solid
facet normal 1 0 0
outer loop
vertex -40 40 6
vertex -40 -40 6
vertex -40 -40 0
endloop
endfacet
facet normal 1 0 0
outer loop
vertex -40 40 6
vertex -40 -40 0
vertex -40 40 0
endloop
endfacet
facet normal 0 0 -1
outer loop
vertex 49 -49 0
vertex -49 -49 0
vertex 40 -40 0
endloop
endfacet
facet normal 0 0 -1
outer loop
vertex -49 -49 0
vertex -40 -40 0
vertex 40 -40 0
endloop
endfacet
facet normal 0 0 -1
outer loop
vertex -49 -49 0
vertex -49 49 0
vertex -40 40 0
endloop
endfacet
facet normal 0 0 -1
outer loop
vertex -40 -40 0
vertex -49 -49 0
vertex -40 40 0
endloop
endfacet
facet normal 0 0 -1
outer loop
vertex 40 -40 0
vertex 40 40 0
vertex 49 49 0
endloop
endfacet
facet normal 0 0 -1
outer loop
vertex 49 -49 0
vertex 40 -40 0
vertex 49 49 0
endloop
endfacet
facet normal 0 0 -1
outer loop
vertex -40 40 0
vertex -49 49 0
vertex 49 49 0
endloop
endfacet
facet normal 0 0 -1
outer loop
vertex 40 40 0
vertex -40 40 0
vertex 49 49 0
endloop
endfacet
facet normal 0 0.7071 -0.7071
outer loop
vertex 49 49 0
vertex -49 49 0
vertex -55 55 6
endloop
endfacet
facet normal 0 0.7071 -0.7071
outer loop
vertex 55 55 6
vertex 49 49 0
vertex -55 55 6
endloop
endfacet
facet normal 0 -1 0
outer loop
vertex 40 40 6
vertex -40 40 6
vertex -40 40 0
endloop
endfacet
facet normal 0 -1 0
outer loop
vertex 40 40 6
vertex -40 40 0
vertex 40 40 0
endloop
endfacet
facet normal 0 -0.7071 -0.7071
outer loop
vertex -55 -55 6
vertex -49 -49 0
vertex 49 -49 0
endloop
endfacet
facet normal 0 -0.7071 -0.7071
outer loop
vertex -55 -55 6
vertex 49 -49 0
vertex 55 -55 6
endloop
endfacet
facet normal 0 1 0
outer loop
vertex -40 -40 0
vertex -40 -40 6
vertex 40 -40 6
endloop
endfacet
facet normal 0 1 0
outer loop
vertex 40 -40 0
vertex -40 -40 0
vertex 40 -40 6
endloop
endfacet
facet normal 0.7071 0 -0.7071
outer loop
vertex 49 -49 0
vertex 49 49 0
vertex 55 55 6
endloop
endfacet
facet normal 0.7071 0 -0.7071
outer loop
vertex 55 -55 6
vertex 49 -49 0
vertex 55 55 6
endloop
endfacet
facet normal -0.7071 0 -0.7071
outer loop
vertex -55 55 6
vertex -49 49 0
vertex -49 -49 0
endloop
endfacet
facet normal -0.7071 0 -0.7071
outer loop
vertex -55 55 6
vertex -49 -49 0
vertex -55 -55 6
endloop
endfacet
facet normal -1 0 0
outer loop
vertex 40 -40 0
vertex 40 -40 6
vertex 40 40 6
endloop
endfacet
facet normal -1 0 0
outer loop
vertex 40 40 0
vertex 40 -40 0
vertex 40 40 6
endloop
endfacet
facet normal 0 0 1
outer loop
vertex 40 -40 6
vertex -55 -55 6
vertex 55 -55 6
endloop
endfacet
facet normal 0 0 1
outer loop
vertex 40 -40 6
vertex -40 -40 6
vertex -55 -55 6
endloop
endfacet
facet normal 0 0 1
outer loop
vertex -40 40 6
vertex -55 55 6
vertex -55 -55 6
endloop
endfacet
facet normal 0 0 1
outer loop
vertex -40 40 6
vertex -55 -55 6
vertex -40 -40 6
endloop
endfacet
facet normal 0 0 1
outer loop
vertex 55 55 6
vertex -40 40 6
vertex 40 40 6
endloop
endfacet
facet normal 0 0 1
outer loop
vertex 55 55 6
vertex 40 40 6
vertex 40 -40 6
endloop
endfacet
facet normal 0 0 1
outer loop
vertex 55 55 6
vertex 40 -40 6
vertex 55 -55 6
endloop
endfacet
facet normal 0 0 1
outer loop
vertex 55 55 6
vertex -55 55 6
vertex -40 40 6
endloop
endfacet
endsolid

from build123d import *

# Parameters (mm, degrees)
SKETCH_W        = 110
SKETCH_H        = 110
PAD_DEPTH       = 6
POCKET_DEPTH    = 110
POCKET001_DEPTH = 110
SKETCH003_W     = 80
SKETCH003_H     = 80
POCKET002_DEPTH = 6


with BuildPart() as part:
    # Sketch → Pad (new body)
    with BuildSketch(Plane.XY):
        Rectangle(SKETCH_W, SKETCH_H)
    extrude(amount=PAD_DEPTH)

    # Sketch002 (on Face3 of Pad) → Pocket (cut)
    with BuildSketch(Plane.XZ.offset(55)):
        Polygon((55, 6), (55, 0), (49, 0), align=None)
        Polygon((-55, 6), (-55, 0), (-49, 0), align=None)
    extrude(amount=-POCKET_DEPTH, mode=Mode.SUBTRACT)

    # Sketch001 (on Face2 of Pad) → Pocket001 (cut)
    with BuildSketch(Plane.YZ.offset(55)):
        Polygon((55, 6), (55, 0), (49, 0), align=None)
        Polygon((-55, 6), (-55, 0), (-49, 0), align=None)
    extrude(amount=-POCKET001_DEPTH, mode=Mode.SUBTRACT)

    # Sketch003 (on Face1 of Pocket001) → Pocket002 (cut)
    with BuildSketch(Plane.XY.offset(6)):
        Rectangle(SKETCH003_W, SKETCH003_H)
    extrude(amount=-POCKET002_DEPTH, mode=Mode.SUBTRACT)


solid = part.part
